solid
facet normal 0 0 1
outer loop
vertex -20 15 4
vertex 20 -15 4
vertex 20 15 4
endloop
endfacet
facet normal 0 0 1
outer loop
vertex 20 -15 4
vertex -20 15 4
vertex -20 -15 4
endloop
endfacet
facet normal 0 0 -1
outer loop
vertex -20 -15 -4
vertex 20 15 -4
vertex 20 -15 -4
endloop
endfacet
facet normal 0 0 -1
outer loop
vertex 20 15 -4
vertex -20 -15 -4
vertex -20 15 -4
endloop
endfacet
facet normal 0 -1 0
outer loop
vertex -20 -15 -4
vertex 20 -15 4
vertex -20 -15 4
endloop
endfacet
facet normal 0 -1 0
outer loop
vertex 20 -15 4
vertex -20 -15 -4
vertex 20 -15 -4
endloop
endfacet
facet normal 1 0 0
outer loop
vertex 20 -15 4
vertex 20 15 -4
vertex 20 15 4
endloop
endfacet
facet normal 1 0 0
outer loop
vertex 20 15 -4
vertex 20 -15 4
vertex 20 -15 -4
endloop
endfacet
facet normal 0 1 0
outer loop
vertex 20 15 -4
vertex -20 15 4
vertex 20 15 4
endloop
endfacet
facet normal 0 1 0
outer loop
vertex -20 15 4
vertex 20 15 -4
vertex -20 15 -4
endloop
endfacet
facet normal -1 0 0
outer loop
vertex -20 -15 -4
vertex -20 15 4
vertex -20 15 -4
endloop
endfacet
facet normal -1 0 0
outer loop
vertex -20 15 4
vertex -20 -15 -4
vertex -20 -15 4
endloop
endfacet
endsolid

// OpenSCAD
// 40 mm long, 30 mm wide, 8 mm high rectangular solid box
// Centered at origin, no holes, all dimensions in mm

difference() {
    // Main solid box
    cube([40, 30, 8], center=true);
    
    // Optional: small cylindrical hole through the length (comment out if not needed)
    // cylinder(h=10, d=4, center=true, $fn=32);
}
